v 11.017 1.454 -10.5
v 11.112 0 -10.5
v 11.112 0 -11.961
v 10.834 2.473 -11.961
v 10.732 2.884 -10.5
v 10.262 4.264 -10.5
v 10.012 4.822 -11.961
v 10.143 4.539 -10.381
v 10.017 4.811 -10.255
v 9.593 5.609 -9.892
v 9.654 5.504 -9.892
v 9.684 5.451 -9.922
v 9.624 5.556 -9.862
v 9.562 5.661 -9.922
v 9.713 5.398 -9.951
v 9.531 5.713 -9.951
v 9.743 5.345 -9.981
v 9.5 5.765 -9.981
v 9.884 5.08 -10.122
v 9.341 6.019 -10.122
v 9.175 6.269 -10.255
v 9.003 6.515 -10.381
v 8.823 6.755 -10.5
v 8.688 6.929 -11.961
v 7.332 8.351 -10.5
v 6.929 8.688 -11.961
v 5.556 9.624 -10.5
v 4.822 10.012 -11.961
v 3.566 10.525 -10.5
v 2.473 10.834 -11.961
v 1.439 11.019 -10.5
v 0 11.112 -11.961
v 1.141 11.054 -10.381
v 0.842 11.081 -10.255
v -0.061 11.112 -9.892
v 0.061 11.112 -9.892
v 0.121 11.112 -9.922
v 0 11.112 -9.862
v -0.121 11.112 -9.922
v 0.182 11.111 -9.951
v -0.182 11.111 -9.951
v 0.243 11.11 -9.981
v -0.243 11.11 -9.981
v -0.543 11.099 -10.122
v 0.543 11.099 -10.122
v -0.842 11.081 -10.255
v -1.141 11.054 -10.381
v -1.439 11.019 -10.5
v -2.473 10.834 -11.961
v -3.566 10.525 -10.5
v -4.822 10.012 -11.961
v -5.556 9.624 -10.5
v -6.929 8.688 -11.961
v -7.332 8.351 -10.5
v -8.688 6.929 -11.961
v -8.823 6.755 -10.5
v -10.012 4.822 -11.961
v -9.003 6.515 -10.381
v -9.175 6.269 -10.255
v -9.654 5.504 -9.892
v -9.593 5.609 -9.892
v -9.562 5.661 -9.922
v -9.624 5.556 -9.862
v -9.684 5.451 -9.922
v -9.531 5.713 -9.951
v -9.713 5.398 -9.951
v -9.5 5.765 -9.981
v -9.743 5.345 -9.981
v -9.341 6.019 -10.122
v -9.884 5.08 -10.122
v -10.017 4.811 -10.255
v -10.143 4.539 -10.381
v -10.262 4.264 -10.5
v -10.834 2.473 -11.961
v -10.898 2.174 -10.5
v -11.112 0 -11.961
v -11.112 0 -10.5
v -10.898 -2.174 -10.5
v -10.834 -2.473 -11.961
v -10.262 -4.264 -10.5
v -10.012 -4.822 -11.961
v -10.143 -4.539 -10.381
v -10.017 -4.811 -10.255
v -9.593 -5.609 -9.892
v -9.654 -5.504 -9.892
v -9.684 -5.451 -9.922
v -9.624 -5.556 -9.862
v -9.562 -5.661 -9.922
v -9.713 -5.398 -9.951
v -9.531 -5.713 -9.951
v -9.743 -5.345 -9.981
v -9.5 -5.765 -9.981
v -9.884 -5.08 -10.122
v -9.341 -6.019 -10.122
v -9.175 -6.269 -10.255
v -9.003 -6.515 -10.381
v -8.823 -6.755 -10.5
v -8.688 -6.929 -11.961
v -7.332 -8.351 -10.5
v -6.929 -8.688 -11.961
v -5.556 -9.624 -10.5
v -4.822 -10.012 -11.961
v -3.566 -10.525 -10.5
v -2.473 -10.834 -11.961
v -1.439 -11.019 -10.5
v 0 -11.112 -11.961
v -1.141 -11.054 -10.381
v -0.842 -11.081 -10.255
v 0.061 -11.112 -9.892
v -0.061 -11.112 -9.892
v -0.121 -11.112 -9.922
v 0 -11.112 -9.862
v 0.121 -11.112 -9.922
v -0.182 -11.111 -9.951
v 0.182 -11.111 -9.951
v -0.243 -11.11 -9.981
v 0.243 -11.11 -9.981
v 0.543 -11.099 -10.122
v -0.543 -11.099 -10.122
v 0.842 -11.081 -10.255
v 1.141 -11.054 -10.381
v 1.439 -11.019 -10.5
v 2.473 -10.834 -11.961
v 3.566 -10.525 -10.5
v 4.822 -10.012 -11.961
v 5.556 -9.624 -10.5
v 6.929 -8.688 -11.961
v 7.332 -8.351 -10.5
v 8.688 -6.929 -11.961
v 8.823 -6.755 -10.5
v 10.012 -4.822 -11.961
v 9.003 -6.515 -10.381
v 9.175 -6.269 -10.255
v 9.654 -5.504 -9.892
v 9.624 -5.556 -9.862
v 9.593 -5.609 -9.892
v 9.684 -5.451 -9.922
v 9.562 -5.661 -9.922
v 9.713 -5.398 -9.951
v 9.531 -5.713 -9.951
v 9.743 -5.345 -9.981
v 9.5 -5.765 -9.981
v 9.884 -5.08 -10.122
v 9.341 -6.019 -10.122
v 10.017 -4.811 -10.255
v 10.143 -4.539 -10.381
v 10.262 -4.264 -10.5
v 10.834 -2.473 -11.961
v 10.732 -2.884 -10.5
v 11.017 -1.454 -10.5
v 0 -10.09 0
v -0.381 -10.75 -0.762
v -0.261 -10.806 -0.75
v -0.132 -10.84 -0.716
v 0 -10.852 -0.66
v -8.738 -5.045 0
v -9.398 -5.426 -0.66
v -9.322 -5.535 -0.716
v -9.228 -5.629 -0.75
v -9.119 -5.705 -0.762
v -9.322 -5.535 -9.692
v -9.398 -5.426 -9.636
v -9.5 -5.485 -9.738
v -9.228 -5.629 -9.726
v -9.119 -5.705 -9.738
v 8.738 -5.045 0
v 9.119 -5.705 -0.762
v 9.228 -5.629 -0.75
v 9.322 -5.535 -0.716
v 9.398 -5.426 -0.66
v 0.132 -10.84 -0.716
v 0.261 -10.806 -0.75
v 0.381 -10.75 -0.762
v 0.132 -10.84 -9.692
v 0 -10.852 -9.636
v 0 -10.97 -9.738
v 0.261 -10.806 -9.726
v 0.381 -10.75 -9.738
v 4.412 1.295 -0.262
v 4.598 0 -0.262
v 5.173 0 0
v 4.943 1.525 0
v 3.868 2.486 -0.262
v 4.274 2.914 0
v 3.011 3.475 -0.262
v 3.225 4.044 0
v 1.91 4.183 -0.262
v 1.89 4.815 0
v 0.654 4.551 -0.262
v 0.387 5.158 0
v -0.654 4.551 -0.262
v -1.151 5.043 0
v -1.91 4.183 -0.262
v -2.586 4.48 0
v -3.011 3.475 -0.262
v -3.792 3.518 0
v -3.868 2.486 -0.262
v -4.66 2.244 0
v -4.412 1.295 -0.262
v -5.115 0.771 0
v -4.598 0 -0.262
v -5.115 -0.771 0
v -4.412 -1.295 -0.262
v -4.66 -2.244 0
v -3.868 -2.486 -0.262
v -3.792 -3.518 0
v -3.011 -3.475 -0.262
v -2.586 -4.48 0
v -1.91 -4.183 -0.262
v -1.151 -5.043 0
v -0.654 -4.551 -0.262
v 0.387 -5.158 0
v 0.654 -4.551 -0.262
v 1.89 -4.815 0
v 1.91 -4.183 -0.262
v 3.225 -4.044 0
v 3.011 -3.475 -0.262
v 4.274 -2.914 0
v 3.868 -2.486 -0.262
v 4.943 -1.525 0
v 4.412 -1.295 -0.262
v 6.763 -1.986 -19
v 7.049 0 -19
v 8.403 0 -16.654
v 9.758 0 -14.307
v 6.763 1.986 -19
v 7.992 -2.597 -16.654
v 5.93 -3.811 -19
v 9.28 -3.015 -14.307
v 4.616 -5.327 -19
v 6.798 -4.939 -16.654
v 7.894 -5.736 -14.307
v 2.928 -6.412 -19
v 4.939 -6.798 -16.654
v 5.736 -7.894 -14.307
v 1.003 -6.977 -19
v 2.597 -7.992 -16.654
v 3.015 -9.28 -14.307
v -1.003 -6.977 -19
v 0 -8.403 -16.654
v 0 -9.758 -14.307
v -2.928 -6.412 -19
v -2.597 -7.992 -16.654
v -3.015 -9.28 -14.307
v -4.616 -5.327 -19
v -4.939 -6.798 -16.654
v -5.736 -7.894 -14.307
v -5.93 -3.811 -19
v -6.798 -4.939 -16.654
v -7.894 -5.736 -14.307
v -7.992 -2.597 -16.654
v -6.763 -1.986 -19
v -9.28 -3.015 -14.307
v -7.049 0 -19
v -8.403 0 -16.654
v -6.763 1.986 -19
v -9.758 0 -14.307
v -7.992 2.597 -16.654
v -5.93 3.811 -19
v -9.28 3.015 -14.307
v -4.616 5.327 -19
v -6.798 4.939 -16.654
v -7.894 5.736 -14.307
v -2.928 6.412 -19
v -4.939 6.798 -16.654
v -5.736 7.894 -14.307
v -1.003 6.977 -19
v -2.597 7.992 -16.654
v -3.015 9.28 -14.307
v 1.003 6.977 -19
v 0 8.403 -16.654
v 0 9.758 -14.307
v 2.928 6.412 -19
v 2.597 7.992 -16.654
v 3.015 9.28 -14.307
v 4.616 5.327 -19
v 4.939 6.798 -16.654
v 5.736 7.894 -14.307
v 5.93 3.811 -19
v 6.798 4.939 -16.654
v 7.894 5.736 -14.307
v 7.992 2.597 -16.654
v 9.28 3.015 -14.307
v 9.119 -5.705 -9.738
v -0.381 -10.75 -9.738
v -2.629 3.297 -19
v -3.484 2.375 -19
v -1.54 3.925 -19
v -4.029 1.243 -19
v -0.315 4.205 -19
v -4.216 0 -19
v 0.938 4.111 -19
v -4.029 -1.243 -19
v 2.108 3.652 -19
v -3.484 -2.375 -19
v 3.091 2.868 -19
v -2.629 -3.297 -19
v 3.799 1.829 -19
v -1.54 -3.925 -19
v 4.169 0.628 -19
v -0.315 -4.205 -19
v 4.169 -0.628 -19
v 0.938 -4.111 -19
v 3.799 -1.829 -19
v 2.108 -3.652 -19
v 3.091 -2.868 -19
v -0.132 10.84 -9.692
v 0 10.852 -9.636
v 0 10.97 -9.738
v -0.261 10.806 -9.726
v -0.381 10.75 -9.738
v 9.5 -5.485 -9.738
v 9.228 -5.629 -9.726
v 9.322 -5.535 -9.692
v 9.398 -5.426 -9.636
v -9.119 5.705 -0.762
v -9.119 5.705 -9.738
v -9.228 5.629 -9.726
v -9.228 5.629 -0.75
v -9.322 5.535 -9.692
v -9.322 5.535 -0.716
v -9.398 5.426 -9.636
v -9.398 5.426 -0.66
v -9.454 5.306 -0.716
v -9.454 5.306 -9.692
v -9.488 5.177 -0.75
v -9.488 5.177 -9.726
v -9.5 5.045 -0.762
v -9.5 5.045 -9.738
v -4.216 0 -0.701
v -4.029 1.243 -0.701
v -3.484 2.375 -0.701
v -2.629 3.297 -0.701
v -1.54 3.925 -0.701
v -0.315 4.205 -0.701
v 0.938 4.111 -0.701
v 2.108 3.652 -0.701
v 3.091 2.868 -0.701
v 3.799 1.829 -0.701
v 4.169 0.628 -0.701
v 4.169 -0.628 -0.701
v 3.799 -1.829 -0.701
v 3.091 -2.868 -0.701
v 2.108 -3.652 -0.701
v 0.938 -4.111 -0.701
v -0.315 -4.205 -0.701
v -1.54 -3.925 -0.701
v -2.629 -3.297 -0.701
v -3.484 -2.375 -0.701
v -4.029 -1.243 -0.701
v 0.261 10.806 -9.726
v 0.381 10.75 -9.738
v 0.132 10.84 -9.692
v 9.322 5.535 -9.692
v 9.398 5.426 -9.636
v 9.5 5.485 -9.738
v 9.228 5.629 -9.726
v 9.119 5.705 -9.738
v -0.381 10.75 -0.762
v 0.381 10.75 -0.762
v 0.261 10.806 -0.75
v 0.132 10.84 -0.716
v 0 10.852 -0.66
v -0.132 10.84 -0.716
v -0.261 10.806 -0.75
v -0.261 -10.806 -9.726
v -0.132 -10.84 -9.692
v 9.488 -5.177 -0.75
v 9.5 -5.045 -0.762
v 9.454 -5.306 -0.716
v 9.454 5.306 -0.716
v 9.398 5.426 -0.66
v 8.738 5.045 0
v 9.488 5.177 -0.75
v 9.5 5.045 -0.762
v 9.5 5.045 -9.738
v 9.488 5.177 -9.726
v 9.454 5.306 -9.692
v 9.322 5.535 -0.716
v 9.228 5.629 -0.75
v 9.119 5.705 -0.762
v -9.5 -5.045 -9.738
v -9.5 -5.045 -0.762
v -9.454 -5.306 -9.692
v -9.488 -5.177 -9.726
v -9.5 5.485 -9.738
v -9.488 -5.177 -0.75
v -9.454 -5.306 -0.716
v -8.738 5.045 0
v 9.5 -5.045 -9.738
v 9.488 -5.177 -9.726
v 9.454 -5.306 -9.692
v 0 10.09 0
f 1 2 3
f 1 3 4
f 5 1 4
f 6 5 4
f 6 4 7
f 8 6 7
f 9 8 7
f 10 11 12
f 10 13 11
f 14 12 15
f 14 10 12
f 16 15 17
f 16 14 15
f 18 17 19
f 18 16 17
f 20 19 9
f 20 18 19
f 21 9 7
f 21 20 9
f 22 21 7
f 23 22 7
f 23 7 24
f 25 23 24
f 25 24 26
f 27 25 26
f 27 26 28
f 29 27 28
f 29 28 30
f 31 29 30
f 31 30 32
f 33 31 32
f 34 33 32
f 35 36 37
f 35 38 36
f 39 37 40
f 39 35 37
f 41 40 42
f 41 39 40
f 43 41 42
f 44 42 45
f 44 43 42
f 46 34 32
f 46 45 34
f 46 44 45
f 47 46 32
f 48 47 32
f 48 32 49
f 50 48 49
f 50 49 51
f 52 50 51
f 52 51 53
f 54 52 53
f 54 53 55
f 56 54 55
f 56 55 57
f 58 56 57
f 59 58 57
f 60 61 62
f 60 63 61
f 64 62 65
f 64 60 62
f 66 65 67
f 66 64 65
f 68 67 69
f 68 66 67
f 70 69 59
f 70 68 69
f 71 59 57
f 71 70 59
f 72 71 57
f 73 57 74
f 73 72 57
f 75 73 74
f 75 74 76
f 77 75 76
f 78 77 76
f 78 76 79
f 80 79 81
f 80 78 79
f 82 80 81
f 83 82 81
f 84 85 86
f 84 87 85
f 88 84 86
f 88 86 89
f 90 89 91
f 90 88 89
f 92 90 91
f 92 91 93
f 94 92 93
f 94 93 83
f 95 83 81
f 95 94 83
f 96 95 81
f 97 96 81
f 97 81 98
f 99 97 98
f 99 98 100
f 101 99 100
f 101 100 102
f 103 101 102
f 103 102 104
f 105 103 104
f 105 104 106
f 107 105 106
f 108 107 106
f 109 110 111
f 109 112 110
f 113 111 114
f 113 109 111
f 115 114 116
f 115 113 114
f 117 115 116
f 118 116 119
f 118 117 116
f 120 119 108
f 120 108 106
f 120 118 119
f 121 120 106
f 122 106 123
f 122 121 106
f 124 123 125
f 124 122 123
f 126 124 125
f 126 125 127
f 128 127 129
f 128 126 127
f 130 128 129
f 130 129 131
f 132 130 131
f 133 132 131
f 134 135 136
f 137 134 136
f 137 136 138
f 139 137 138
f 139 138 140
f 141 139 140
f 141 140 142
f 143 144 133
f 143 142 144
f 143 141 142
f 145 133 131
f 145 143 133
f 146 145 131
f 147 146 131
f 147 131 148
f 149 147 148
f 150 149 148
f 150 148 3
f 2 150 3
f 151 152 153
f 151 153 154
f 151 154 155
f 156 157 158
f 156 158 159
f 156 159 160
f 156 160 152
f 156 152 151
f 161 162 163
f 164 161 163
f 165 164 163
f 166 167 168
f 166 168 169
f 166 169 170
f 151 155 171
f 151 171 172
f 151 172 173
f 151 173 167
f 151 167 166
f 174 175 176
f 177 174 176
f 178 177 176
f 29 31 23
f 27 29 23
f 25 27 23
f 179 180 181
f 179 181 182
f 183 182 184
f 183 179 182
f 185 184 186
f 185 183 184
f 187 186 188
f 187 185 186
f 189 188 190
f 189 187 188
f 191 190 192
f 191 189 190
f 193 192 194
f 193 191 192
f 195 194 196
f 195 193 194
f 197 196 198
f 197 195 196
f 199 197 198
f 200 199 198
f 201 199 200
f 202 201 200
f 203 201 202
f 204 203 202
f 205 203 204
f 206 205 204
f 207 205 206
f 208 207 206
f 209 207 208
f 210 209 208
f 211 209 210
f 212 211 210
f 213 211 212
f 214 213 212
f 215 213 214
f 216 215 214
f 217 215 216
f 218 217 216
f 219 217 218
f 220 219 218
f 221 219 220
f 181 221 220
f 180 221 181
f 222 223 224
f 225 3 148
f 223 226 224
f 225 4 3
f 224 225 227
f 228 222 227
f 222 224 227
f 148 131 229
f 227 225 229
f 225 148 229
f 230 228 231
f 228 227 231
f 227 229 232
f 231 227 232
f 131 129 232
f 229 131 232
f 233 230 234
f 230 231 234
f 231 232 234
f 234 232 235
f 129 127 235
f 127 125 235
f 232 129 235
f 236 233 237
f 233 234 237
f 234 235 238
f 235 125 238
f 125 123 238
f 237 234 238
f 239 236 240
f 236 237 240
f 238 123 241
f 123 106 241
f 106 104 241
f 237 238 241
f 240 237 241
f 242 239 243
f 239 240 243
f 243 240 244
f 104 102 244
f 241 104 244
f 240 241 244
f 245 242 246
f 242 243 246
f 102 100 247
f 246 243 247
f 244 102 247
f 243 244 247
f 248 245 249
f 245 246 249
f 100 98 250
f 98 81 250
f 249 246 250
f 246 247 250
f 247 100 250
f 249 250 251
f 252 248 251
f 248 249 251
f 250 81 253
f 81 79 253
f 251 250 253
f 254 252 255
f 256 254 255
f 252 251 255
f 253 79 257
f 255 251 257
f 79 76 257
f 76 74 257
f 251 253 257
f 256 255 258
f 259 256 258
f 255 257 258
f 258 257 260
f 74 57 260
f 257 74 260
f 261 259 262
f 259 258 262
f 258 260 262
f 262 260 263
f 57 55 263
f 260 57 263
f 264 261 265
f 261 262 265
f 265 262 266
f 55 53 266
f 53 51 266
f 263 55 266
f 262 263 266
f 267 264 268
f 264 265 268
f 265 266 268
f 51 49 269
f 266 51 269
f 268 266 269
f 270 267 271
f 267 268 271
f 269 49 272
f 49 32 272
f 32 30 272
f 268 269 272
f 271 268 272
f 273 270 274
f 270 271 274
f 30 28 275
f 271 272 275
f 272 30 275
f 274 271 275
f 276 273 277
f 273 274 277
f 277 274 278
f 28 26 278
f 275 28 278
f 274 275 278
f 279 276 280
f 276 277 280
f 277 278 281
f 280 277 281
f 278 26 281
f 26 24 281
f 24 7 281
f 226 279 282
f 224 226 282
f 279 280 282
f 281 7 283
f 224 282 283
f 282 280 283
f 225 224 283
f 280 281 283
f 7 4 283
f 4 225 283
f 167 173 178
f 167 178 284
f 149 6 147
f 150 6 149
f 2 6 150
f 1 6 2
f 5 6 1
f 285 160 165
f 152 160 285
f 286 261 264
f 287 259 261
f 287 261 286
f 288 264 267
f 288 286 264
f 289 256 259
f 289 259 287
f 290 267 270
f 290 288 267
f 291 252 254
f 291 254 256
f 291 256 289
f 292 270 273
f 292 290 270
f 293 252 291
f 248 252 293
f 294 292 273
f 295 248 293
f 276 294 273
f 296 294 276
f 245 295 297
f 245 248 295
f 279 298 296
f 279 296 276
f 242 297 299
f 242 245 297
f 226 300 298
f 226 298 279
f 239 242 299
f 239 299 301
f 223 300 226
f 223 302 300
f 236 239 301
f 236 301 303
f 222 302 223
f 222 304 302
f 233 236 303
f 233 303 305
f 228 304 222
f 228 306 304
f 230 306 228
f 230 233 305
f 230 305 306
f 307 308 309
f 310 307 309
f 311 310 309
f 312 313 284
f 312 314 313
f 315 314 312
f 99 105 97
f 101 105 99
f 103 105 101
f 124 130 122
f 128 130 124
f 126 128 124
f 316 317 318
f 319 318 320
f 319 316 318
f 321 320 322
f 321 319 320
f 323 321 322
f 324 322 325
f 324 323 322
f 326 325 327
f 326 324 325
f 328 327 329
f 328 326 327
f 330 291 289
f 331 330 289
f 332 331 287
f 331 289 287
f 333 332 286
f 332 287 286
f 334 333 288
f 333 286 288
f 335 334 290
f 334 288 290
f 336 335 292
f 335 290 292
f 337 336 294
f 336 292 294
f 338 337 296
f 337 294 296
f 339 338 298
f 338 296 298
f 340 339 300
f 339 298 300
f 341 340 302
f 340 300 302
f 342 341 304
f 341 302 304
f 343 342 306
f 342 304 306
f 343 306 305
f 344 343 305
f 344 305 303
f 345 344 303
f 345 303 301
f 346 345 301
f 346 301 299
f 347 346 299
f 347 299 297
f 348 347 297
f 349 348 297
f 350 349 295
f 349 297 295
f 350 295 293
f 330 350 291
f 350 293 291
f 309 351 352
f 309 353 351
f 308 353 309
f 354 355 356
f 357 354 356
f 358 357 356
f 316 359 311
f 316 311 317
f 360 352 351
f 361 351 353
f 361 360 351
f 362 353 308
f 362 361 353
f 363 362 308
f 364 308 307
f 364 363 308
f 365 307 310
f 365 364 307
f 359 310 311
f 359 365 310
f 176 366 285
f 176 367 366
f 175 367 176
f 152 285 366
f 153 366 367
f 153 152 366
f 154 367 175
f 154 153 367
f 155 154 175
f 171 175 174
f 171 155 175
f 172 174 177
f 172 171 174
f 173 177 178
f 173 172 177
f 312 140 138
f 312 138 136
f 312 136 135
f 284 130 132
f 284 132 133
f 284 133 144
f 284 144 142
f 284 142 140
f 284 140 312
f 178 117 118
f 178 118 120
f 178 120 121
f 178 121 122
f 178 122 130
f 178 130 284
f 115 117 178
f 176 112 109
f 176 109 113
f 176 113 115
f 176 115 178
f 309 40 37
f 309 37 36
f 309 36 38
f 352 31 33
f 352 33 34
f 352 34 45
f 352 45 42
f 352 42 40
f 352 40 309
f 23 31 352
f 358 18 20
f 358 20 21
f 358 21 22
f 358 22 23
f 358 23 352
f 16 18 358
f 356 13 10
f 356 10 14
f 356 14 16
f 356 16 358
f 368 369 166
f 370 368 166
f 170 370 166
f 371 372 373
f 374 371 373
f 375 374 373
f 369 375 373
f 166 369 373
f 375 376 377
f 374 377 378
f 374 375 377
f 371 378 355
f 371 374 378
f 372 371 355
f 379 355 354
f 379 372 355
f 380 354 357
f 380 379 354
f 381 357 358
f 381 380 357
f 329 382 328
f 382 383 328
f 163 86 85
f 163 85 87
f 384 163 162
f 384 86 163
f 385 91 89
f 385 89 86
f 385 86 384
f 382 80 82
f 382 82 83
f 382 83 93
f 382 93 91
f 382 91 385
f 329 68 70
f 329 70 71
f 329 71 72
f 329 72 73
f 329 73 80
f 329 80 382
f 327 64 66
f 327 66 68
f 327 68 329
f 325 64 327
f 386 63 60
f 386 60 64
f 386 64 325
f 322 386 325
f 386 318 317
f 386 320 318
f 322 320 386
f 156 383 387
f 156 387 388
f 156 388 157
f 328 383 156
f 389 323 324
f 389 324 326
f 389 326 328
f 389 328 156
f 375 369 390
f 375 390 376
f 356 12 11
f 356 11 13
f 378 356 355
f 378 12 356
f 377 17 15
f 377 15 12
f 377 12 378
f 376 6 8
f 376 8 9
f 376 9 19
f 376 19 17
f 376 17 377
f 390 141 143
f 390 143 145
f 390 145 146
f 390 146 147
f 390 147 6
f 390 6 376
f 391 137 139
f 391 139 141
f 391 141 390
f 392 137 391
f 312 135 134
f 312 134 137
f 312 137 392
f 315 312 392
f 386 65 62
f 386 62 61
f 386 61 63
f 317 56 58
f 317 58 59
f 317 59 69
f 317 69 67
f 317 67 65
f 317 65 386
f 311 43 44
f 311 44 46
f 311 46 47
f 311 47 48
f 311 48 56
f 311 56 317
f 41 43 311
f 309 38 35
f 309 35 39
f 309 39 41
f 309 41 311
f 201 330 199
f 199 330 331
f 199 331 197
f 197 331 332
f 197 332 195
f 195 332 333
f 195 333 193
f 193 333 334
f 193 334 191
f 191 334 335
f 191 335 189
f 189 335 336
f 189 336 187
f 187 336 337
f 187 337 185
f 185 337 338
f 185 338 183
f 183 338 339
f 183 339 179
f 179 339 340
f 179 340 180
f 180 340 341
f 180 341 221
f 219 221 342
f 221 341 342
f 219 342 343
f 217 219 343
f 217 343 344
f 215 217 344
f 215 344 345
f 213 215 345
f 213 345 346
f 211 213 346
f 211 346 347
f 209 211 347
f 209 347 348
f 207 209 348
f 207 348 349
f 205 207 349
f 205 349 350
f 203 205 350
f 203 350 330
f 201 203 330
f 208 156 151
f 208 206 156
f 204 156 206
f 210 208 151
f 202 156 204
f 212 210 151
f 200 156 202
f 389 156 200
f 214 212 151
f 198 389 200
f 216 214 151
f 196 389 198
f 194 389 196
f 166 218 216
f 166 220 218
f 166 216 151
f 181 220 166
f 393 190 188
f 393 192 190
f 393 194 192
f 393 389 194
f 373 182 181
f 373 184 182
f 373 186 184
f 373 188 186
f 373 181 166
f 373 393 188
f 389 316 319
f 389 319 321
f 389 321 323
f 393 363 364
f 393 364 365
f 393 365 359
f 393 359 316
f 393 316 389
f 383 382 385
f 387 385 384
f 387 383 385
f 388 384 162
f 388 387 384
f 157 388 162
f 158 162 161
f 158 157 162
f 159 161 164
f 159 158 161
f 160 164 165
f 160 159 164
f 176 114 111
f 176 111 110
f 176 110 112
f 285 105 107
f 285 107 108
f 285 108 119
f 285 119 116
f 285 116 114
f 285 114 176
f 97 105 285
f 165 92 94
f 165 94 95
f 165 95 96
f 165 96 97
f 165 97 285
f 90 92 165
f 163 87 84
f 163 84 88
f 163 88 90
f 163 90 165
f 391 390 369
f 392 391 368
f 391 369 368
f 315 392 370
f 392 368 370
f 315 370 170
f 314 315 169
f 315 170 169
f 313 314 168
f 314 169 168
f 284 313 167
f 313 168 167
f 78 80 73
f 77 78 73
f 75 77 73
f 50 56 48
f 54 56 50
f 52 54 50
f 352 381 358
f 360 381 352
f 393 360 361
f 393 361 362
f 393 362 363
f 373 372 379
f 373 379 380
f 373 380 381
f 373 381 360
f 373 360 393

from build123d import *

# Parameters (mm, degrees)
F1_DEPTH       = 19
F2_D           = 8.4328
F2_CSINK_D     = 9.652
F2_CSINK_ANGLE = 82
F3_R           = 11.1125
F3_R_2         = 4.2164
F4_DEPTH       = 8.5
F5_SIZE2       = 7.039054482
F5_SIZE        = 4.064
F6_T1_DEPTH    = 14.8888999883
F6_T3_DEPTH    = 14.8888999883
F6_T5_DEPTH    = 14.8888999883
F6_T7_DEPTH    = 14.8888999883
F6_T9_DEPTH    = 14.8888999883
F7_T4_DEPTH    = 14.8888999883
F7_S5_R        = 11.1125
F7_T6_DEPTH    = 9
F7_T12_DEPTH   = 14.8888999883
F7_S13_R       = 11.1125
F7_T14_DEPTH   = 9
F7_T20_DEPTH   = 14.8888999883
F7_S21_R       = 11.1125
F7_T22_DEPTH   = 9
F7_T28_DEPTH   = 14.8888999883
F7_S29_R       = 11.1125
F7_T30_DEPTH   = 9
F7_T36_DEPTH   = 14.8888999883
F7_S37_R       = 11.1125
F7_T38_DEPTH   = 9
F7_T44_DEPTH   = 14.8888999883
F7_S45_R       = 11.1125
F7_T46_DEPTH   = 9
F7_T53_DEPTH   = 14.8888999883
F7_S54_R       = 11.1125
F7_T55_DEPTH   = 9
F7_T59_DEPTH   = 14.8888999883
F7_S60_R       = 11.1125
F7_T61_DEPTH   = 9
F7_T68_DEPTH   = 14.8888999883
F7_S69_R       = 11.1125
F7_T70_DEPTH   = 9
F7_T74_DEPTH   = 14.8888999883
F7_S75_R       = 11.1125
F7_T76_DEPTH   = 9
F7_T83_DEPTH   = 14.8888999883
F7_S84_R       = 11.1125
F7_T85_DEPTH   = 9
F7_T89_DEPTH   = 14.8888999883
F7_S90_R       = 11.1125
F7_T91_DEPTH   = 9
F7_T98_DEPTH   = 14.8888999883
F7_S99_R       = 11.1125
F7_T100_DEPTH  = 9
F7_T104_DEPTH  = 14.8888999883
F7_S105_R      = 11.1125
F7_T106_DEPTH  = 9
F7_T113_DEPTH  = 14.8888999883
F7_S114_R      = 11.1125
F7_T115_DEPTH  = 9
F7_T119_DEPTH  = 14.8888999883
F7_S120_R      = 11.1125
F7_T121_DEPTH  = 9
F7_T128_DEPTH  = 14.8888999883
F7_S129_R      = 11.1125
F7_T130_DEPTH  = 9
F7_T134_DEPTH  = 14.8888999883
F7_S135_R      = 11.1125
F7_T136_DEPTH  = 9
F8_T4_DEPTH    = 11.1757045256
F8_T10_DEPTH   = 11.1757045256
F8_T16_DEPTH   = 11.1757045256
F8_T22_DEPTH   = 11.1757045256
F8_T28_DEPTH   = 11.1757045256
F8_T34_DEPTH   = 11.1757045256
F8_T40_DEPTH   = 11.1757045256
F8_T46_DEPTH   = 11.1757045256
F8_T52_DEPTH   = 11.1757045256
F8_T58_DEPTH   = 11.1757045256
F8_T64_DEPTH   = 11.1757045256
F8_T70_DEPTH   = 11.1757045256
F8_T76_DEPTH   = 11.1757045256
F8_T82_DEPTH   = 11.1757045256
F8_T88_DEPTH   = 11.1757045256
F8_T94_DEPTH   = 11.1757045256
F8_T100_DEPTH  = 11.1757045256
F8_T106_DEPTH  = 11.1757045256


# Not quite as in the source:
# - a fillet or chamfer that OpenCascade refuses, or shapes differently, is made with other operations: its cross-section is extruded or revolved along the edge and cut away or added


with BuildPart() as f1:
    # F0 (on Top) → F1 (new body)
    with BuildSketch(Plane.XY):
        Polygon((9.5, -5.4848275573), (9.5, 5.4848275573), (0, 10.9696551146), (-9.5, 5.4848275573), (-9.5, -5.4848275573), (0, -10.9696551146), align=None)
    extrude(amount=-F1_DEPTH)

    # F2 (through all)
    with Locations(Plane.XY):
        with Locations((0, 0)):
            CounterSinkHole(F2_D / 2, F2_CSINK_D / 2, counter_sink_angle=F2_CSINK_ANGLE)

    # F3 (on face) → F4 (join)
    with BuildSketch(Plane(origin=(0, 0, -19), x_dir=(1, 0, 0), z_dir=(0, 0, -1))):
        Circle(F3_R)
        Circle(F3_R_2, mode=Mode.SUBTRACT)
    extrude(amount=-F4_DEPTH)

    # F5
    f5_edges = [f1.edges().sort_by_distance(p)[0] for p in [
        (-11.1125, 0, -19),
    ]]
    f5_side = f1.faces().sort_by_distance((-10.798191, 0, -19))[0]
    chamfer(f5_edges, length=F5_SIZE, length2=F5_SIZE2, reference=f5_side)

    # F6: chamfer of 0.762 on 7 edges, made by hand

    # F6_s2 → F6_t1 (cut)
    with BuildSketch(Plane.XZ.offset(-7.4444499941)):
        Polygon((9.5, -0.762), (8.738, 0), (9.5, 0), align=None)
        Polygon((-9.5, -0.762), (-8.738, 0), (-9.5, 0), align=None)
    extrude(amount=F6_T1_DEPTH, mode=Mode.SUBTRACT)

    # F6_s4 → F6_t3 (cut)
    with BuildSketch(Plane(origin=(-6.4470828121, -3.7222249971, 0), x_dir=(0, 0, 1), z_dir=(0.8660254038, 0.5, 0))):
        Polygon((-0.762, 9.5), (0, 8.738), (0, 9.5), align=None)
    extrude(amount=F6_T3_DEPTH, mode=Mode.SUBTRACT)

    # F6_s6 → F6_t5 (cut)
    with BuildSketch(Plane(origin=(6.4470828121, -3.7222249971, 0), x_dir=(0, 0, 1), z_dir=(-0.8660254038, 0.5, 0))):
        Polygon((-0.762, 9.5), (0, 8.738), (0, 9.5), align=None)
    extrude(amount=F6_T5_DEPTH, mode=Mode.SUBTRACT)

    # F6_s8 → F6_t7 (cut)
    with BuildSketch(Plane(origin=(-6.4470828121, 3.7222249971, 0), x_dir=(0, 0, 1), z_dir=(0.8660254038, -0.5, 0))):
        Polygon((-0.762, 9.5), (0, 8.738), (0, 9.5), align=None)
    extrude(amount=F6_T7_DEPTH, mode=Mode.SUBTRACT)

    # F6_s10 → F6_t9 (cut)
    with BuildSketch(Plane(origin=(6.4470828121, 3.7222249971, 0), x_dir=(0, 0, 1), z_dir=(-0.8660254038, -0.5, 0))):
        Polygon((-0.762, 9.5), (0, 8.738), (0, 9.5), align=None)
    extrude(amount=F6_T9_DEPTH, mode=Mode.SUBTRACT)

    # F6_s11 → F6_t12 (revolve, cut)
    with BuildSketch(Plane.XZ):
        Polygon((5.1727200241, 0), (4.5972787828, -0.2624888611), (4.8251319511, 0), align=None)
    revolve(axis=Axis((0, 0, 0), (0, 0, 1)), mode=Mode.SUBTRACT)

    # F7: chamfer of 0.762 on 6 edges, made by hand


with BuildPart() as f7_tool2:
    # F7_s3 → F7_t4 (new body)
    with BuildSketch(Plane(origin=(-6.4470828121, 3.7222249971, 0), x_dir=(0, 0, 1), z_dir=(0.8660254038, -0.5, 0))):
        Polygon((-10.5, 10.262), (-9.738, 9.5), (-10.5, 9.5), align=None)
    extrude(amount=F7_T4_DEPTH)

    # F7_s5 → F7_t6 (intersect, symmetric)
    with BuildSketch(Plane.XY.offset(-10.1)):
        Circle(F7_S5_R)
    extrude(amount=F7_T6_DEPTH, both=True, mode=Mode.INTERSECT)

    split(bisect_by=Plane(origin=(4.75, -8.227241336, 0), x_dir=(0, 0, 1), z_dir=(-0.5, 0.8660254038, 0)), keep=Keep.TOP)

    split(bisect_by=Plane.YZ.offset(-9.5), keep=Keep.TOP)


with BuildPart() as f1_1:
    add(f1.part)

    # F7_t1: union F7_tool2
    add(f7_tool2.part)


with BuildPart() as f7_tool10:
    # F7_s11 → F7_t12 (new body)
    with BuildSketch(Plane(origin=(-6.4470828121, -3.7222249971, 0), x_dir=(0, 0, 1), z_dir=(0.8660254038, 0.5, 0))):
        Polygon((-10.5, 10.262), (-9.738, 9.5), (-10.5, 9.5), align=None)
    extrude(amount=F7_T12_DEPTH)

    # F7_s13 → F7_t14 (intersect, symmetric)
    with BuildSketch(Plane.XY.offset(-10.1)):
        Circle(F7_S13_R)
    extrude(amount=F7_T14_DEPTH, both=True, mode=Mode.INTERSECT)

    split(bisect_by=Plane.YZ.offset(9.5), keep=Keep.BOTTOM)

    split(bisect_by=Plane(origin=(-4.75, -8.227241336, 0), x_dir=(0, 0, 1), z_dir=(0.5, 0.8660254038, 0)), keep=Keep.TOP)


with BuildPart() as f1_2:
    add(f1_1.part)

    # F7_t9: union F7_tool10
    add(f7_tool10.part)


with BuildPart() as f7_tool18:
    # F7_s19 → F7_t20 (new body)
    with BuildSketch(Plane.XZ.offset(7.4444499941)):
        Polygon((10.262, -10.5), (9.5, -9.738), (9.5, -10.5), align=None)
    extrude(amount=-F7_T20_DEPTH)

    # F7_s21 → F7_t22 (intersect, symmetric)
    with BuildSketch(Plane.XY.offset(-10.1)):
        Circle(F7_S21_R)
    extrude(amount=F7_T22_DEPTH, both=True, mode=Mode.INTERSECT)

    split(bisect_by=Plane(origin=(4.75, -8.227241336, 0), x_dir=(0, 0, 1), z_dir=(-0.5, 0.8660254038, 0)), keep=Keep.TOP)

    split(bisect_by=Plane(origin=(4.75, 8.227241336, 0), x_dir=(0, 0, 1), z_dir=(-0.5, -0.8660254038, 0)), keep=Keep.TOP)


with BuildPart() as f1_3:
    add(f1_2.part)

    # F7_t17: union F7_tool18
    add(f7_tool18.part)


with BuildPart() as f7_tool26:
    # F7_s27 → F7_t28 (new body)
    with BuildSketch(Plane(origin=(6.4470828121, -3.7222249971, 0), x_dir=(0, 0, 1), z_dir=(-0.8660254038, 0.5, 0))):
        Polygon((-10.5, 10.262), (-9.738, 9.5), (-10.5, 9.5), align=None)
    extrude(amount=F7_T28_DEPTH)

    # F7_s29 → F7_t30 (intersect, symmetric)
    with BuildSketch(Plane.XY.offset(-10.1)):
        Circle(F7_S29_R)
    extrude(amount=F7_T30_DEPTH, both=True, mode=Mode.INTERSECT)

    split(bisect_by=Plane(origin=(-4.75, 8.227241336, 0), x_dir=(0, 0, 1), z_dir=(0.5, -0.8660254038, 0)), keep=Keep.TOP)

    split(bisect_by=Plane.YZ.offset(9.5), keep=Keep.BOTTOM)


with BuildPart() as f1_4:
    add(f1_3.part)

    # F7_t25: union F7_tool26
    add(f7_tool26.part)


with BuildPart() as f7_tool34:
    # F7_s35 → F7_t36 (new body)
    with BuildSketch(Plane(origin=(6.4470828121, 3.7222249971, 0), x_dir=(0, 0, 1), z_dir=(-0.8660254038, -0.5, 0))):
        Polygon((-10.5, 10.262), (-9.738, 9.5), (-10.5, 9.5), align=None)
    extrude(amount=F7_T36_DEPTH)

    # F7_s37 → F7_t38 (intersect, symmetric)
    with BuildSketch(Plane.XY.offset(-10.1)):
        Circle(F7_S37_R)
    extrude(amount=F7_T38_DEPTH, both=True, mode=Mode.INTERSECT)

    split(bisect_by=Plane.YZ.offset(-9.5), keep=Keep.TOP)

    split(bisect_by=Plane(origin=(4.75, 8.227241336, 0), x_dir=(0, 0, 1), z_dir=(-0.5, -0.8660254038, 0)), keep=Keep.TOP)


with BuildPart() as f1_5:
    add(f1_4.part)

    # F7_t33: union F7_tool34
    add(f7_tool34.part)


with BuildPart() as f7_tool42:
    # F7_s43 → F7_t44 (new body)
    with BuildSketch(Plane.XZ.offset(-7.4444499941)):
        Polygon((-10.262, -10.5), (-9.5, -9.738), (-9.5, -10.5), align=None)
    extrude(amount=F7_T44_DEPTH)

    # F7_s45 → F7_t46 (intersect, symmetric)
    with BuildSketch(Plane.XY.offset(-10.1)):
        Circle(F7_S45_R)
    extrude(amount=F7_T46_DEPTH, both=True, mode=Mode.INTERSECT)

    split(bisect_by=Plane(origin=(-4.75, -8.227241336, 0), x_dir=(0, 0, 1), z_dir=(0.5, 0.8660254038, 0)), keep=Keep.TOP)

    split(bisect_by=Plane(origin=(-4.75, 8.227241336, 0), x_dir=(0, 0, 1), z_dir=(0.5, -0.8660254038, 0)), keep=Keep.TOP)


with BuildPart() as f1_6:
    add(f1_5.part)

    # F7_t41: union F7_tool42
    add(f7_tool42.part)


with BuildPart() as f7_tool51:
    # F7_s52 → F7_t53 (new body)
    with BuildSketch(Plane(origin=(-6.4470828121, 3.7222249971, 0), x_dir=(0, 0, 1), z_dir=(0.8660254038, -0.5, 0))):
        Polygon((-10.5, 10.262), (-9.738, 9.5), (-10.5, 9.5), align=None)
    extrude(amount=F7_T53_DEPTH)

    # F7_s54 → F7_t55 (intersect, symmetric)
    with BuildSketch(Plane.XY.offset(-10.1)):
        Circle(F7_S54_R)
    extrude(amount=F7_T55_DEPTH, both=True, mode=Mode.INTERSECT)

    split(bisect_by=Plane.YZ.offset(-9.5), keep=Keep.BOTTOM)


with BuildPart() as f7_tool57:
    # F7_s58 → F7_t59 (new body)
    with BuildSketch(Plane.XZ.offset(-7.4444499941)):
        Polygon((-10.262, -10.5), (-9.5, -9.738), (-9.5, -10.5), align=None)
    extrude(amount=F7_T59_DEPTH)

    # F7_s60 → F7_t61 (intersect, symmetric)
    with BuildSketch(Plane.XY.offset(-10.1)):
        Circle(F7_S60_R)
    extrude(amount=F7_T61_DEPTH, both=True, mode=Mode.INTERSECT)

    split(bisect_by=Plane(origin=(-4.75, -8.227241336, 0), x_dir=(0, 0, 1), z_dir=(-0.5, -0.8660254038, 0)), keep=Keep.TOP)


with BuildPart() as f7_tool51_1:
    add(f7_tool51.part)

    # F7_t63: intersect F7_tool57
    add(f7_tool57.part, mode=Mode.INTERSECT)


with BuildPart() as f1_7:
    add(f1_6.part)

    # F7_t49: union F7_tool51
    add(f7_tool51_1.part)


with BuildPart() as f7_tool66:
    # F7_s67 → F7_t68 (new body)
    with BuildSketch(Plane(origin=(-6.4470828121, -3.7222249971, 0), x_dir=(0, 0, 1), z_dir=(0.8660254038, 0.5, 0))):
        Polygon((-10.5, 10.262), (-9.738, 9.5), (-10.5, 9.5), align=None)
    extrude(amount=F7_T68_DEPTH)

    # F7_s69 → F7_t70 (intersect, symmetric)
    with BuildSketch(Plane.XY.offset(-10.1)):
        Circle(F7_S69_R)
    extrude(amount=F7_T70_DEPTH, both=True, mode=Mode.INTERSECT)

    split(bisect_by=Plane(origin=(-4.75, -8.227241336, 0), x_dir=(0, 0, 1), z_dir=(-0.5, -0.8660254038, 0)), keep=Keep.TOP)


with BuildPart() as f7_tool72:
    # F7_s73 → F7_t74 (new body)
    with BuildSketch(Plane(origin=(-6.4470828121, 3.7222249971, 0), x_dir=(0, 0, 1), z_dir=(0.8660254038, -0.5, 0))):
        Polygon((-10.5, 10.262), (-9.738, 9.5), (-10.5, 9.5), align=None)
    extrude(amount=F7_T74_DEPTH)

    # F7_s75 → F7_t76 (intersect, symmetric)
    with BuildSketch(Plane.XY.offset(-10.1)):
        Circle(F7_S75_R)
    extrude(amount=F7_T76_DEPTH, both=True, mode=Mode.INTERSECT)

    split(bisect_by=Plane(origin=(4.75, -8.227241336, 0), x_dir=(0, 0, 1), z_dir=(0.5, -0.8660254038, 0)), keep=Keep.TOP)


with BuildPart() as f7_tool66_1:
    add(f7_tool66.part)

    # F7_t78: intersect F7_tool72
    add(f7_tool72.part, mode=Mode.INTERSECT)


with BuildPart() as f1_8:
    add(f1_7.part)

    # F7_t64: union F7_tool66
    add(f7_tool66_1.part)


with BuildPart() as f7_tool81:
    # F7_s82 → F7_t83 (new body)
    with BuildSketch(Plane(origin=(-6.4470828121, -3.7222249971, 0), x_dir=(0, 0, 1), z_dir=(0.8660254038, 0.5, 0))):
        Polygon((-10.5, 10.262), (-9.738, 9.5), (-10.5, 9.5), align=None)
    extrude(amount=F7_T83_DEPTH)

    # F7_s84 → F7_t85 (intersect, symmetric)
    with BuildSketch(Plane.XY.offset(-10.1)):
        Circle(F7_S84_R)
    extrude(amount=F7_T85_DEPTH, both=True, mode=Mode.INTERSECT)

    split(bisect_by=Plane.YZ.offset(9.5), keep=Keep.TOP)


with BuildPart() as f7_tool87:
    # F7_s88 → F7_t89 (new body)
    with BuildSketch(Plane.XZ.offset(7.4444499941)):
        Polygon((10.262, -10.5), (9.5, -9.738), (9.5, -10.5), align=None)
    extrude(amount=-F7_T89_DEPTH)

    # F7_s90 → F7_t91 (intersect, symmetric)
    with BuildSketch(Plane.XY.offset(-10.1)):
        Circle(F7_S90_R)
    extrude(amount=F7_T91_DEPTH, both=True, mode=Mode.INTERSECT)

    split(bisect_by=Plane(origin=(4.75, -8.227241336, 0), x_dir=(0, 0, 1), z_dir=(0.5, -0.8660254038, 0)), keep=Keep.TOP)


with BuildPart() as f7_tool81_1:
    add(f7_tool81.part)

    # F7_t93: intersect F7_tool87
    add(f7_tool87.part, mode=Mode.INTERSECT)


with BuildPart() as f1_9:
    add(f1_8.part)

    # F7_t79: union F7_tool81
    add(f7_tool81_1.part)


with BuildPart() as f7_tool96:
    # F7_s97 → F7_t98 (new body)
    with BuildSketch(Plane(origin=(6.4470828121, -3.7222249971, 0), x_dir=(0, 0, 1), z_dir=(-0.8660254038, 0.5, 0))):
        Polygon((-10.5, 10.262), (-9.738, 9.5), (-10.5, 9.5), align=None)
    extrude(amount=F7_T98_DEPTH)

    # F7_s99 → F7_t100 (intersect, symmetric)
    with BuildSketch(Plane.XY.offset(-10.1)):
        Circle(F7_S99_R)
    extrude(amount=F7_T100_DEPTH, both=True, mode=Mode.INTERSECT)

    split(bisect_by=Plane.YZ.offset(9.5), keep=Keep.TOP)


with BuildPart() as f7_tool102:
    # F7_s103 → F7_t104 (new body)
    with BuildSketch(Plane.XZ.offset(7.4444499941)):
        Polygon((10.262, -10.5), (9.5, -9.738), (9.5, -10.5), align=None)
    extrude(amount=-F7_T104_DEPTH)

    # F7_s105 → F7_t106 (intersect, symmetric)
    with BuildSketch(Plane.XY.offset(-10.1)):
        Circle(F7_S105_R)
    extrude(amount=F7_T106_DEPTH, both=True, mode=Mode.INTERSECT)

    split(bisect_by=Plane(origin=(4.75, 8.227241336, 0), x_dir=(0, 0, 1), z_dir=(0.5, 0.8660254038, 0)), keep=Keep.TOP)


with BuildPart() as f7_tool96_1:
    add(f7_tool96.part)

    # F7_t108: intersect F7_tool102
    add(f7_tool102.part, mode=Mode.INTERSECT)


with BuildPart() as f1_10:
    add(f1_9.part)

    # F7_t94: union F7_tool96
    add(f7_tool96_1.part)


with BuildPart() as f7_tool111:
    # F7_s112 → F7_t113 (new body)
    with BuildSketch(Plane(origin=(6.4470828121, 3.7222249971, 0), x_dir=(0, 0, 1), z_dir=(-0.8660254038, -0.5, 0))):
        Polygon((-10.5, 10.262), (-9.738, 9.5), (-10.5, 9.5), align=None)
    extrude(amount=F7_T113_DEPTH)

    # F7_s114 → F7_t115 (intersect, symmetric)
    with BuildSketch(Plane.XY.offset(-10.1)):
        Circle(F7_S114_R)
    extrude(amount=F7_T115_DEPTH, both=True, mode=Mode.INTERSECT)

    split(bisect_by=Plane(origin=(4.75, 8.227241336, 0), x_dir=(0, 0, 1), z_dir=(0.5, 0.8660254038, 0)), keep=Keep.TOP)


with BuildPart() as f7_tool117:
    # F7_s118 → F7_t119 (new body)
    with BuildSketch(Plane(origin=(6.4470828121, -3.7222249971, 0), x_dir=(0, 0, 1), z_dir=(-0.8660254038, 0.5, 0))):
        Polygon((-10.5, 10.262), (-9.738, 9.5), (-10.5, 9.5), align=None)
    extrude(amount=F7_T119_DEPTH)

    # F7_s120 → F7_t121 (intersect, symmetric)
    with BuildSketch(Plane.XY.offset(-10.1)):
        Circle(F7_S120_R)
    extrude(amount=F7_T121_DEPTH, both=True, mode=Mode.INTERSECT)

    split(bisect_by=Plane(origin=(-4.75, 8.227241336, 0), x_dir=(0, 0, 1), z_dir=(-0.5, 0.8660254038, 0)), keep=Keep.TOP)


with BuildPart() as f7_tool111_1:
    add(f7_tool111.part)

    # F7_t123: intersect F7_tool117
    add(f7_tool117.part, mode=Mode.INTERSECT)


with BuildPart() as f1_11:
    add(f1_10.part)

    # F7_t109: union F7_tool111
    add(f7_tool111_1.part)


with BuildPart() as f7_tool126:
    # F7_s127 → F7_t128 (new body)
    with BuildSketch(Plane.XZ.offset(-7.4444499941)):
        Polygon((-10.262, -10.5), (-9.5, -9.738), (-9.5, -10.5), align=None)
    extrude(amount=F7_T128_DEPTH)

    # F7_s129 → F7_t130 (intersect, symmetric)
    with BuildSketch(Plane.XY.offset(-10.1)):
        Circle(F7_S129_R)
    extrude(amount=F7_T130_DEPTH, both=True, mode=Mode.INTERSECT)

    split(bisect_by=Plane(origin=(-4.75, 8.227241336, 0), x_dir=(0, 0, 1), z_dir=(-0.5, 0.8660254038, 0)), keep=Keep.TOP)


with BuildPart() as f7_tool132:
    # F7_s133 → F7_t134 (new body)
    with BuildSketch(Plane(origin=(6.4470828121, 3.7222249971, 0), x_dir=(0, 0, 1), z_dir=(-0.8660254038, -0.5, 0))):
        Polygon((-10.5, 10.262), (-9.738, 9.5), (-10.5, 9.5), align=None)
    extrude(amount=F7_T134_DEPTH)

    # F7_s135 → F7_t136 (intersect, symmetric)
    with BuildSketch(Plane.XY.offset(-10.1)):
        Circle(F7_S135_R)
    extrude(amount=F7_T136_DEPTH, both=True, mode=Mode.INTERSECT)

    split(bisect_by=Plane.YZ.offset(-9.5), keep=Keep.BOTTOM)


with BuildPart() as f7_tool126_1:
    add(f7_tool126.part)

    # F7_t138: intersect F7_tool132
    add(f7_tool132.part, mode=Mode.INTERSECT)


with BuildPart() as f1_12:
    add(f1_11.part)

    # F7_t124: union F7_tool126
    add(f7_tool126_1.part)

    # F8: fillet of radius 0.762 on 6 edges, made by hand


with BuildPart() as f8_tool2:
    # F8_s3 → F8_t4 (new body)
    with BuildSketch(Plane.XY.offset(0.3378522628)):
        with BuildLine():
            ThreePointArc((9.5, -5.0448866522), (9.3979113577, -5.4258866522), (9.119, -5.7047980099))
            Line((9.119, -5.7047980099), (9.5, -5.4848275573))
            Line((9.5, -5.4848275573), (9.5, -5.0448866522))
        make_face()
    extrude(amount=-F8_T4_DEPTH)

    split(bisect_by=Plane(origin=(-0.119, 0, -0.119), x_dir=(0, 1, 0), z_dir=(0.7071067812, 0, 0.7071067812)), keep=Keep.TOP)

    split(bisect_by=Plane(origin=(-0.0595, 0.1030570231, -0.119), x_dir=(0.8660254038, 0.5, 0), z_dir=(0.3535533906, -0.6123724357, 0.7071067812)), keep=Keep.TOP)


with BuildPart() as f1_13:
    add(f1_12.part)

    # F8_t1: cut F8_tool2
    add(f8_tool2.part, mode=Mode.SUBTRACT)


with BuildPart() as f8_tool8:
    # F8_s9 → F8_t10 (new body)
    with BuildSketch(Plane.XY.offset(0.3378522628)):
        with BuildLine():
            ThreePointArc((9.5, -5.0448866522), (9.3979113577, -5.4258866522), (9.119, -5.7047980099))
            Line((9.119, -5.7047980099), (9.5, -5.4848275573))
            Line((9.5, -5.4848275573), (9.5, -5.0448866522))
        make_face()
    extrude(amount=-F8_T10_DEPTH)

    split(bisect_by=Plane(origin=(-0.119, 0, -0.119), x_dir=(0, 1, 0), z_dir=(-0.7071067812, 0, -0.7071067812)), keep=Keep.TOP)

    split(bisect_by=Plane(origin=(-0.0595, 0.1030570231, -0.119), x_dir=(0.8660254038, 0.5, 0), z_dir=(0.3535533906, -0.6123724357, 0.7071067812)), keep=Keep.TOP)


with BuildPart() as f1_14:
    add(f1_13.part)

    # F8_t7: cut F8_tool8
    add(f8_tool8.part, mode=Mode.SUBTRACT)


with BuildPart() as f8_tool14:
    # F8_s15 → F8_t16 (new body)
    with BuildSketch(Plane.XY.offset(0.3378522628)):
        with BuildLine():
            ThreePointArc((9.5, -5.0448866522), (9.3979113577, -5.4258866522), (9.119, -5.7047980099))
            Line((9.119, -5.7047980099), (9.5, -5.4848275573))
            Line((9.5, -5.4848275573), (9.5, -5.0448866522))
        make_face()
    extrude(amount=-F8_T16_DEPTH)

    split(bisect_by=Plane(origin=(-0.119, 0, -0.119), x_dir=(0, 1, 0), z_dir=(0.7071067812, 0, 0.7071067812)), keep=Keep.TOP)

    split(bisect_by=Plane(origin=(-0.0595, 0.1030570231, -0.119), x_dir=(-0.8660254038, -0.5, 0), z_dir=(-0.3535533906, 0.6123724357, -0.7071067812)), keep=Keep.TOP)


with BuildPart() as f1_15:
    add(f1_14.part)

    # F8_t13: cut F8_tool14
    add(f8_tool14.part, mode=Mode.SUBTRACT)


with BuildPart() as f8_tool20:
    # F8_s21 → F8_t22 (new body)
    with BuildSketch(Plane.XY.offset(0.3378522628)):
        with BuildLine():
            ThreePointArc((-0.381, -10.749684662), (0, -10.8517733044), (0.381, -10.749684662))
            Line((0.381, -10.749684662), (0, -10.9696551146))
            Line((0, -10.9696551146), (-0.381, -10.749684662))
        make_face()
    extrude(amount=-F8_T22_DEPTH)

    split(bisect_by=Plane(origin=(0.0595, 0.1030570231, -0.119), x_dir=(0.8660254038, -0.5, 0), z_dir=(-0.3535533906, -0.6123724357, 0.7071067812)), keep=Keep.TOP)

    split(bisect_by=Plane(origin=(-0.0595, 0.1030570231, -0.119), x_dir=(0.8660254038, 0.5, 0), z_dir=(0.3535533906, -0.6123724357, 0.7071067812)), keep=Keep.TOP)


with BuildPart() as f1_16:
    add(f1_15.part)

    # F8_t19: cut F8_tool20
    add(f8_tool20.part, mode=Mode.SUBTRACT)


with BuildPart() as f8_tool26:
    # F8_s27 → F8_t28 (new body)
    with BuildSketch(Plane.XY.offset(0.3378522628)):
        with BuildLine():
            ThreePointArc((-0.381, -10.749684662), (0, -10.8517733044), (0.381, -10.749684662))
            Line((0.381, -10.749684662), (0, -10.9696551146))
            Line((0, -10.9696551146), (-0.381, -10.749684662))
        make_face()
    extrude(amount=-F8_T28_DEPTH)

    split(bisect_by=Plane(origin=(0.0595, 0.1030570231, -0.119), x_dir=(-0.8660254038, 0.5, 0), z_dir=(0.3535533906, 0.6123724357, -0.7071067812)), keep=Keep.TOP)

    split(bisect_by=Plane(origin=(-0.0595, 0.1030570231, -0.119), x_dir=(0.8660254038, 0.5, 0), z_dir=(0.3535533906, -0.6123724357, 0.7071067812)), keep=Keep.TOP)


with BuildPart() as f1_17:
    add(f1_16.part)

    # F8_t25: cut F8_tool26
    add(f8_tool26.part, mode=Mode.SUBTRACT)


with BuildPart() as f8_tool32:
    # F8_s33 → F8_t34 (new body)
    with BuildSketch(Plane.XY.offset(0.3378522628)):
        with BuildLine():
            ThreePointArc((-0.381, -10.749684662), (0, -10.8517733044), (0.381, -10.749684662))
            Line((0.381, -10.749684662), (0, -10.9696551146))
            Line((0, -10.9696551146), (-0.381, -10.749684662))
        make_face()
    extrude(amount=-F8_T34_DEPTH)

    split(bisect_by=Plane(origin=(0.0595, 0.1030570231, -0.119), x_dir=(0.8660254038, -0.5, 0), z_dir=(-0.3535533906, -0.6123724357, 0.7071067812)), keep=Keep.TOP)

    split(bisect_by=Plane(origin=(-0.0595, 0.1030570231, -0.119), x_dir=(-0.8660254038, -0.5, 0), z_dir=(-0.3535533906, 0.6123724357, -0.7071067812)), keep=Keep.TOP)


with BuildPart() as f1_18:
    add(f1_17.part)

    # F8_t31: cut F8_tool32
    add(f8_tool32.part, mode=Mode.SUBTRACT)


with BuildPart() as f8_tool38:
    # F8_s39 → F8_t40 (new body)
    with BuildSketch(Plane.XY.offset(0.3378522628)):
        with BuildLine():
            ThreePointArc((-9.5, -5.0448866522), (-9.3979113577, -5.4258866522), (-9.119, -5.7047980099))
            Line((-9.119, -5.7047980099), (-9.5, -5.4848275573))
            Line((-9.5, -5.4848275573), (-9.5, -5.0448866522))
        make_face()
    extrude(amount=-F8_T40_DEPTH)

    split(bisect_by=Plane(origin=(0.119, 0, -0.119), x_dir=(0, 1, 0), z_dir=(-0.7071067812, 0, 0.7071067812)), keep=Keep.TOP)

    split(bisect_by=Plane(origin=(0.0595, 0.1030570231, -0.119), x_dir=(0.8660254038, -0.5, 0), z_dir=(-0.3535533906, -0.6123724357, 0.7071067812)), keep=Keep.TOP)


with BuildPart() as f1_19:
    add(f1_18.part)

    # F8_t37: cut F8_tool38
    add(f8_tool38.part, mode=Mode.SUBTRACT)


with BuildPart() as f8_tool44:
    # F8_s45 → F8_t46 (new body)
    with BuildSketch(Plane.XY.offset(0.3378522628)):
        with BuildLine():
            ThreePointArc((-9.5, -5.0448866522), (-9.3979113577, -5.4258866522), (-9.119, -5.7047980099))
            Line((-9.119, -5.7047980099), (-9.5, -5.4848275573))
            Line((-9.5, -5.4848275573), (-9.5, -5.0448866522))
        make_face()
    extrude(amount=-F8_T46_DEPTH)

    split(bisect_by=Plane(origin=(0.119, 0, -0.119), x_dir=(0, 1, 0), z_dir=(0.7071067812, 0, -0.7071067812)), keep=Keep.TOP)

    split(bisect_by=Plane(origin=(0.0595, 0.1030570231, -0.119), x_dir=(0.8660254038, -0.5, 0), z_dir=(-0.3535533906, -0.6123724357, 0.7071067812)), keep=Keep.TOP)


with BuildPart() as f1_20:
    add(f1_19.part)

    # F8_t43: cut F8_tool44
    add(f8_tool44.part, mode=Mode.SUBTRACT)


with BuildPart() as f8_tool50:
    # F8_s51 → F8_t52 (new body)
    with BuildSketch(Plane.XY.offset(0.3378522628)):
        with BuildLine():
            ThreePointArc((-9.5, -5.0448866522), (-9.3979113577, -5.4258866522), (-9.119, -5.7047980099))
            Line((-9.119, -5.7047980099), (-9.5, -5.4848275573))
            Line((-9.5, -5.4848275573), (-9.5, -5.0448866522))
        make_face()
    extrude(amount=-F8_T52_DEPTH)

    split(bisect_by=Plane(origin=(0.119, 0, -0.119), x_dir=(0, 1, 0), z_dir=(-0.7071067812, 0, 0.7071067812)), keep=Keep.TOP)

    split(bisect_by=Plane(origin=(0.0595, 0.1030570231, -0.119), x_dir=(-0.8660254038, 0.5, 0), z_dir=(0.3535533906, 0.6123724357, -0.7071067812)), keep=Keep.TOP)


with BuildPart() as f1_21:
    add(f1_20.part)

    # F8_t49: cut F8_tool50
    add(f8_tool50.part, mode=Mode.SUBTRACT)


with BuildPart() as f8_tool56:
    # F8_s57 → F8_t58 (new body)
    with BuildSketch(Plane.XY.offset(0.3378522628)):
        with BuildLine():
            ThreePointArc((-9.119, 5.7047980099), (-9.3979113577, 5.4258866522), (-9.5, 5.0448866522))
            Line((-9.5, 5.0448866522), (-9.5, 5.4848275573))
            Line((-9.5, 5.4848275573), (-9.119, 5.7047980099))
        make_face()
    extrude(amount=-F8_T58_DEPTH)

    split(bisect_by=Plane(origin=(0.0595, -0.1030570231, -0.119), x_dir=(-0.8660254038, -0.5, 0), z_dir=(-0.3535533906, 0.6123724357, 0.7071067812)), keep=Keep.TOP)

    split(bisect_by=Plane(origin=(0.119, 0, -0.119), x_dir=(0, 1, 0), z_dir=(-0.7071067812, 0, 0.7071067812)), keep=Keep.TOP)


with BuildPart() as f1_22:
    add(f1_21.part)

    # F8_t55: cut F8_tool56
    add(f8_tool56.part, mode=Mode.SUBTRACT)


with BuildPart() as f8_tool62:
    # F8_s63 → F8_t64 (new body)
    with BuildSketch(Plane.XY.offset(0.3378522628)):
        with BuildLine():
            ThreePointArc((-9.119, 5.7047980099), (-9.3979113577, 5.4258866522), (-9.5, 5.0448866522))
            Line((-9.5, 5.0448866522), (-9.5, 5.4848275573))
            Line((-9.5, 5.4848275573), (-9.119, 5.7047980099))
        make_face()
    extrude(amount=-F8_T64_DEPTH)

    split(bisect_by=Plane(origin=(0.0595, -0.1030570231, -0.119), x_dir=(0.8660254038, 0.5, 0), z_dir=(0.3535533906, -0.6123724357, -0.7071067812)), keep=Keep.TOP)

    split(bisect_by=Plane(origin=(0.119, 0, -0.119), x_dir=(0, 1, 0), z_dir=(-0.7071067812, 0, 0.7071067812)), keep=Keep.TOP)


with BuildPart() as f1_23:
    add(f1_22.part)

    # F8_t61: cut F8_tool62
    add(f8_tool62.part, mode=Mode.SUBTRACT)


with BuildPart() as f8_tool68:
    # F8_s69 → F8_t70 (new body)
    with BuildSketch(Plane.XY.offset(0.3378522628)):
        with BuildLine():
            ThreePointArc((-9.119, 5.7047980099), (-9.3979113577, 5.4258866522), (-9.5, 5.0448866522))
            Line((-9.5, 5.0448866522), (-9.5, 5.4848275573))
            Line((-9.5, 5.4848275573), (-9.119, 5.7047980099))
        make_face()
    extrude(amount=-F8_T70_DEPTH)

    split(bisect_by=Plane(origin=(0.0595, -0.1030570231, -0.119), x_dir=(-0.8660254038, -0.5, 0), z_dir=(-0.3535533906, 0.6123724357, 0.7071067812)), keep=Keep.TOP)

    split(bisect_by=Plane(origin=(0.119, 0, -0.119), x_dir=(0, 1, 0), z_dir=(0.7071067812, 0, -0.7071067812)), keep=Keep.TOP)


with BuildPart() as f1_24:
    add(f1_23.part)

    # F8_t67: cut F8_tool68
    add(f8_tool68.part, mode=Mode.SUBTRACT)


with BuildPart() as f8_tool74:
    # F8_s75 → F8_t76 (new body)
    with BuildSketch(Plane.XY.offset(0.3378522628)):
        with BuildLine():
            ThreePointArc((0.381, 10.749684662), (0, 10.8517733044), (-0.381, 10.749684662))
            Line((-0.381, 10.749684662), (0, 10.9696551146))
            Line((0, 10.9696551146), (0.381, 10.749684662))
        make_face()
    extrude(amount=-F8_T76_DEPTH)

    split(bisect_by=Plane(origin=(-0.0595, -0.1030570231, -0.119), x_dir=(-0.8660254038, 0.5, 0), z_dir=(0.3535533906, 0.6123724357, 0.7071067812)), keep=Keep.TOP)

    split(bisect_by=Plane(origin=(0.0595, -0.1030570231, -0.119), x_dir=(-0.8660254038, -0.5, 0), z_dir=(-0.3535533906, 0.6123724357, 0.7071067812)), keep=Keep.TOP)


with BuildPart() as f1_25:
    add(f1_24.part)

    # F8_t73: cut F8_tool74
    add(f8_tool74.part, mode=Mode.SUBTRACT)


with BuildPart() as f8_tool80:
    # F8_s81 → F8_t82 (new body)
    with BuildSketch(Plane.XY.offset(0.3378522628)):
        with BuildLine():
            ThreePointArc((0.381, 10.749684662), (0, 10.8517733044), (-0.381, 10.749684662))
            Line((-0.381, 10.749684662), (0, 10.9696551146))
            Line((0, 10.9696551146), (0.381, 10.749684662))
        make_face()
    extrude(amount=-F8_T82_DEPTH)

    split(bisect_by=Plane(origin=(-0.0595, -0.1030570231, -0.119), x_dir=(0.8660254038, -0.5, 0), z_dir=(-0.3535533906, -0.6123724357, -0.7071067812)), keep=Keep.TOP)

    split(bisect_by=Plane(origin=(0.0595, -0.1030570231, -0.119), x_dir=(-0.8660254038, -0.5, 0), z_dir=(-0.3535533906, 0.6123724357, 0.7071067812)), keep=Keep.TOP)


with BuildPart() as f1_26:
    add(f1_25.part)

    # F8_t79: cut F8_tool80
    add(f8_tool80.part, mode=Mode.SUBTRACT)


with BuildPart() as f8_tool86:
    # F8_s87 → F8_t88 (new body)
    with BuildSketch(Plane.XY.offset(0.3378522628)):
        with BuildLine():
            ThreePointArc((0.381, 10.749684662), (0, 10.8517733044), (-0.381, 10.749684662))
            Line((-0.381, 10.749684662), (0, 10.9696551146))
            Line((0, 10.9696551146), (0.381, 10.749684662))
        make_face()
    extrude(amount=-F8_T88_DEPTH)

    split(bisect_by=Plane(origin=(-0.0595, -0.1030570231, -0.119), x_dir=(-0.8660254038, 0.5, 0), z_dir=(0.3535533906, 0.6123724357, 0.7071067812)), keep=Keep.TOP)

    split(bisect_by=Plane(origin=(0.0595, -0.1030570231, -0.119), x_dir=(0.8660254038, 0.5, 0), z_dir=(0.3535533906, -0.6123724357, -0.7071067812)), keep=Keep.TOP)


with BuildPart() as f1_27:
    add(f1_26.part)

    # F8_t85: cut F8_tool86
    add(f8_tool86.part, mode=Mode.SUBTRACT)


with BuildPart() as f8_tool92:
    # F8_s93 → F8_t94 (new body)
    with BuildSketch(Plane.XY.offset(0.3378522628)):
        with BuildLine():
            ThreePointArc((9.5, 5.0448866522), (9.3979113577, 5.4258866522), (9.119, 5.7047980099))
            Line((9.119, 5.7047980099), (9.5, 5.4848275573))
            Line((9.5, 5.4848275573), (9.5, 5.0448866522))
        make_face()
    extrude(amount=-F8_T94_DEPTH)

    split(bisect_by=Plane(origin=(-0.119, 0, -0.119), x_dir=(0, 1, 0), z_dir=(0.7071067812, 0, 0.7071067812)), keep=Keep.TOP)

    split(bisect_by=Plane(origin=(-0.0595, -0.1030570231, -0.119), x_dir=(-0.8660254038, 0.5, 0), z_dir=(0.3535533906, 0.6123724357, 0.7071067812)), keep=Keep.TOP)


with BuildPart() as f1_28:
    add(f1_27.part)

    # F8_t91: cut F8_tool92
    add(f8_tool92.part, mode=Mode.SUBTRACT)


with BuildPart() as f8_tool98:
    # F8_s99 → F8_t100 (new body)
    with BuildSketch(Plane.XY.offset(0.3378522628)):
        with BuildLine():
            ThreePointArc((9.5, 5.0448866522), (9.3979113577, 5.4258866522), (9.119, 5.7047980099))
            Line((9.119, 5.7047980099), (9.5, 5.4848275573))
            Line((9.5, 5.4848275573), (9.5, 5.0448866522))
        make_face()
    extrude(amount=-F8_T100_DEPTH)

    split(bisect_by=Plane(origin=(-0.119, 0, -0.119), x_dir=(0, 1, 0), z_dir=(-0.7071067812, 0, -0.7071067812)), keep=Keep.TOP)

    split(bisect_by=Plane(origin=(-0.0595, -0.1030570231, -0.119), x_dir=(-0.8660254038, 0.5, 0), z_dir=(0.3535533906, 0.6123724357, 0.7071067812)), keep=Keep.TOP)


with BuildPart() as f1_29:
    add(f1_28.part)

    # F8_t97: cut F8_tool98
    add(f8_tool98.part, mode=Mode.SUBTRACT)


with BuildPart() as f8_tool104:
    # F8_s105 → F8_t106 (new body)
    with BuildSketch(Plane.XY.offset(0.3378522628)):
        with BuildLine():
            ThreePointArc((9.5, 5.0448866522), (9.3979113577, 5.4258866522), (9.119, 5.7047980099))
            Line((9.119, 5.7047980099), (9.5, 5.4848275573))
            Line((9.5, 5.4848275573), (9.5, 5.0448866522))
        make_face()
    extrude(amount=-F8_T106_DEPTH)

    split(bisect_by=Plane(origin=(-0.119, 0, -0.119), x_dir=(0, 1, 0), z_dir=(0.7071067812, 0, 0.7071067812)), keep=Keep.TOP)

    split(bisect_by=Plane(origin=(-0.0595, -0.1030570231, -0.119), x_dir=(0.8660254038, -0.5, 0), z_dir=(-0.3535533906, -0.6123724357, -0.7071067812)), keep=Keep.TOP)


with BuildPart() as f1_30:
    add(f1_29.part)

    # F8_t103: cut F8_tool104
    add(f8_tool104.part, mode=Mode.SUBTRACT)


solid = f1_30.part
